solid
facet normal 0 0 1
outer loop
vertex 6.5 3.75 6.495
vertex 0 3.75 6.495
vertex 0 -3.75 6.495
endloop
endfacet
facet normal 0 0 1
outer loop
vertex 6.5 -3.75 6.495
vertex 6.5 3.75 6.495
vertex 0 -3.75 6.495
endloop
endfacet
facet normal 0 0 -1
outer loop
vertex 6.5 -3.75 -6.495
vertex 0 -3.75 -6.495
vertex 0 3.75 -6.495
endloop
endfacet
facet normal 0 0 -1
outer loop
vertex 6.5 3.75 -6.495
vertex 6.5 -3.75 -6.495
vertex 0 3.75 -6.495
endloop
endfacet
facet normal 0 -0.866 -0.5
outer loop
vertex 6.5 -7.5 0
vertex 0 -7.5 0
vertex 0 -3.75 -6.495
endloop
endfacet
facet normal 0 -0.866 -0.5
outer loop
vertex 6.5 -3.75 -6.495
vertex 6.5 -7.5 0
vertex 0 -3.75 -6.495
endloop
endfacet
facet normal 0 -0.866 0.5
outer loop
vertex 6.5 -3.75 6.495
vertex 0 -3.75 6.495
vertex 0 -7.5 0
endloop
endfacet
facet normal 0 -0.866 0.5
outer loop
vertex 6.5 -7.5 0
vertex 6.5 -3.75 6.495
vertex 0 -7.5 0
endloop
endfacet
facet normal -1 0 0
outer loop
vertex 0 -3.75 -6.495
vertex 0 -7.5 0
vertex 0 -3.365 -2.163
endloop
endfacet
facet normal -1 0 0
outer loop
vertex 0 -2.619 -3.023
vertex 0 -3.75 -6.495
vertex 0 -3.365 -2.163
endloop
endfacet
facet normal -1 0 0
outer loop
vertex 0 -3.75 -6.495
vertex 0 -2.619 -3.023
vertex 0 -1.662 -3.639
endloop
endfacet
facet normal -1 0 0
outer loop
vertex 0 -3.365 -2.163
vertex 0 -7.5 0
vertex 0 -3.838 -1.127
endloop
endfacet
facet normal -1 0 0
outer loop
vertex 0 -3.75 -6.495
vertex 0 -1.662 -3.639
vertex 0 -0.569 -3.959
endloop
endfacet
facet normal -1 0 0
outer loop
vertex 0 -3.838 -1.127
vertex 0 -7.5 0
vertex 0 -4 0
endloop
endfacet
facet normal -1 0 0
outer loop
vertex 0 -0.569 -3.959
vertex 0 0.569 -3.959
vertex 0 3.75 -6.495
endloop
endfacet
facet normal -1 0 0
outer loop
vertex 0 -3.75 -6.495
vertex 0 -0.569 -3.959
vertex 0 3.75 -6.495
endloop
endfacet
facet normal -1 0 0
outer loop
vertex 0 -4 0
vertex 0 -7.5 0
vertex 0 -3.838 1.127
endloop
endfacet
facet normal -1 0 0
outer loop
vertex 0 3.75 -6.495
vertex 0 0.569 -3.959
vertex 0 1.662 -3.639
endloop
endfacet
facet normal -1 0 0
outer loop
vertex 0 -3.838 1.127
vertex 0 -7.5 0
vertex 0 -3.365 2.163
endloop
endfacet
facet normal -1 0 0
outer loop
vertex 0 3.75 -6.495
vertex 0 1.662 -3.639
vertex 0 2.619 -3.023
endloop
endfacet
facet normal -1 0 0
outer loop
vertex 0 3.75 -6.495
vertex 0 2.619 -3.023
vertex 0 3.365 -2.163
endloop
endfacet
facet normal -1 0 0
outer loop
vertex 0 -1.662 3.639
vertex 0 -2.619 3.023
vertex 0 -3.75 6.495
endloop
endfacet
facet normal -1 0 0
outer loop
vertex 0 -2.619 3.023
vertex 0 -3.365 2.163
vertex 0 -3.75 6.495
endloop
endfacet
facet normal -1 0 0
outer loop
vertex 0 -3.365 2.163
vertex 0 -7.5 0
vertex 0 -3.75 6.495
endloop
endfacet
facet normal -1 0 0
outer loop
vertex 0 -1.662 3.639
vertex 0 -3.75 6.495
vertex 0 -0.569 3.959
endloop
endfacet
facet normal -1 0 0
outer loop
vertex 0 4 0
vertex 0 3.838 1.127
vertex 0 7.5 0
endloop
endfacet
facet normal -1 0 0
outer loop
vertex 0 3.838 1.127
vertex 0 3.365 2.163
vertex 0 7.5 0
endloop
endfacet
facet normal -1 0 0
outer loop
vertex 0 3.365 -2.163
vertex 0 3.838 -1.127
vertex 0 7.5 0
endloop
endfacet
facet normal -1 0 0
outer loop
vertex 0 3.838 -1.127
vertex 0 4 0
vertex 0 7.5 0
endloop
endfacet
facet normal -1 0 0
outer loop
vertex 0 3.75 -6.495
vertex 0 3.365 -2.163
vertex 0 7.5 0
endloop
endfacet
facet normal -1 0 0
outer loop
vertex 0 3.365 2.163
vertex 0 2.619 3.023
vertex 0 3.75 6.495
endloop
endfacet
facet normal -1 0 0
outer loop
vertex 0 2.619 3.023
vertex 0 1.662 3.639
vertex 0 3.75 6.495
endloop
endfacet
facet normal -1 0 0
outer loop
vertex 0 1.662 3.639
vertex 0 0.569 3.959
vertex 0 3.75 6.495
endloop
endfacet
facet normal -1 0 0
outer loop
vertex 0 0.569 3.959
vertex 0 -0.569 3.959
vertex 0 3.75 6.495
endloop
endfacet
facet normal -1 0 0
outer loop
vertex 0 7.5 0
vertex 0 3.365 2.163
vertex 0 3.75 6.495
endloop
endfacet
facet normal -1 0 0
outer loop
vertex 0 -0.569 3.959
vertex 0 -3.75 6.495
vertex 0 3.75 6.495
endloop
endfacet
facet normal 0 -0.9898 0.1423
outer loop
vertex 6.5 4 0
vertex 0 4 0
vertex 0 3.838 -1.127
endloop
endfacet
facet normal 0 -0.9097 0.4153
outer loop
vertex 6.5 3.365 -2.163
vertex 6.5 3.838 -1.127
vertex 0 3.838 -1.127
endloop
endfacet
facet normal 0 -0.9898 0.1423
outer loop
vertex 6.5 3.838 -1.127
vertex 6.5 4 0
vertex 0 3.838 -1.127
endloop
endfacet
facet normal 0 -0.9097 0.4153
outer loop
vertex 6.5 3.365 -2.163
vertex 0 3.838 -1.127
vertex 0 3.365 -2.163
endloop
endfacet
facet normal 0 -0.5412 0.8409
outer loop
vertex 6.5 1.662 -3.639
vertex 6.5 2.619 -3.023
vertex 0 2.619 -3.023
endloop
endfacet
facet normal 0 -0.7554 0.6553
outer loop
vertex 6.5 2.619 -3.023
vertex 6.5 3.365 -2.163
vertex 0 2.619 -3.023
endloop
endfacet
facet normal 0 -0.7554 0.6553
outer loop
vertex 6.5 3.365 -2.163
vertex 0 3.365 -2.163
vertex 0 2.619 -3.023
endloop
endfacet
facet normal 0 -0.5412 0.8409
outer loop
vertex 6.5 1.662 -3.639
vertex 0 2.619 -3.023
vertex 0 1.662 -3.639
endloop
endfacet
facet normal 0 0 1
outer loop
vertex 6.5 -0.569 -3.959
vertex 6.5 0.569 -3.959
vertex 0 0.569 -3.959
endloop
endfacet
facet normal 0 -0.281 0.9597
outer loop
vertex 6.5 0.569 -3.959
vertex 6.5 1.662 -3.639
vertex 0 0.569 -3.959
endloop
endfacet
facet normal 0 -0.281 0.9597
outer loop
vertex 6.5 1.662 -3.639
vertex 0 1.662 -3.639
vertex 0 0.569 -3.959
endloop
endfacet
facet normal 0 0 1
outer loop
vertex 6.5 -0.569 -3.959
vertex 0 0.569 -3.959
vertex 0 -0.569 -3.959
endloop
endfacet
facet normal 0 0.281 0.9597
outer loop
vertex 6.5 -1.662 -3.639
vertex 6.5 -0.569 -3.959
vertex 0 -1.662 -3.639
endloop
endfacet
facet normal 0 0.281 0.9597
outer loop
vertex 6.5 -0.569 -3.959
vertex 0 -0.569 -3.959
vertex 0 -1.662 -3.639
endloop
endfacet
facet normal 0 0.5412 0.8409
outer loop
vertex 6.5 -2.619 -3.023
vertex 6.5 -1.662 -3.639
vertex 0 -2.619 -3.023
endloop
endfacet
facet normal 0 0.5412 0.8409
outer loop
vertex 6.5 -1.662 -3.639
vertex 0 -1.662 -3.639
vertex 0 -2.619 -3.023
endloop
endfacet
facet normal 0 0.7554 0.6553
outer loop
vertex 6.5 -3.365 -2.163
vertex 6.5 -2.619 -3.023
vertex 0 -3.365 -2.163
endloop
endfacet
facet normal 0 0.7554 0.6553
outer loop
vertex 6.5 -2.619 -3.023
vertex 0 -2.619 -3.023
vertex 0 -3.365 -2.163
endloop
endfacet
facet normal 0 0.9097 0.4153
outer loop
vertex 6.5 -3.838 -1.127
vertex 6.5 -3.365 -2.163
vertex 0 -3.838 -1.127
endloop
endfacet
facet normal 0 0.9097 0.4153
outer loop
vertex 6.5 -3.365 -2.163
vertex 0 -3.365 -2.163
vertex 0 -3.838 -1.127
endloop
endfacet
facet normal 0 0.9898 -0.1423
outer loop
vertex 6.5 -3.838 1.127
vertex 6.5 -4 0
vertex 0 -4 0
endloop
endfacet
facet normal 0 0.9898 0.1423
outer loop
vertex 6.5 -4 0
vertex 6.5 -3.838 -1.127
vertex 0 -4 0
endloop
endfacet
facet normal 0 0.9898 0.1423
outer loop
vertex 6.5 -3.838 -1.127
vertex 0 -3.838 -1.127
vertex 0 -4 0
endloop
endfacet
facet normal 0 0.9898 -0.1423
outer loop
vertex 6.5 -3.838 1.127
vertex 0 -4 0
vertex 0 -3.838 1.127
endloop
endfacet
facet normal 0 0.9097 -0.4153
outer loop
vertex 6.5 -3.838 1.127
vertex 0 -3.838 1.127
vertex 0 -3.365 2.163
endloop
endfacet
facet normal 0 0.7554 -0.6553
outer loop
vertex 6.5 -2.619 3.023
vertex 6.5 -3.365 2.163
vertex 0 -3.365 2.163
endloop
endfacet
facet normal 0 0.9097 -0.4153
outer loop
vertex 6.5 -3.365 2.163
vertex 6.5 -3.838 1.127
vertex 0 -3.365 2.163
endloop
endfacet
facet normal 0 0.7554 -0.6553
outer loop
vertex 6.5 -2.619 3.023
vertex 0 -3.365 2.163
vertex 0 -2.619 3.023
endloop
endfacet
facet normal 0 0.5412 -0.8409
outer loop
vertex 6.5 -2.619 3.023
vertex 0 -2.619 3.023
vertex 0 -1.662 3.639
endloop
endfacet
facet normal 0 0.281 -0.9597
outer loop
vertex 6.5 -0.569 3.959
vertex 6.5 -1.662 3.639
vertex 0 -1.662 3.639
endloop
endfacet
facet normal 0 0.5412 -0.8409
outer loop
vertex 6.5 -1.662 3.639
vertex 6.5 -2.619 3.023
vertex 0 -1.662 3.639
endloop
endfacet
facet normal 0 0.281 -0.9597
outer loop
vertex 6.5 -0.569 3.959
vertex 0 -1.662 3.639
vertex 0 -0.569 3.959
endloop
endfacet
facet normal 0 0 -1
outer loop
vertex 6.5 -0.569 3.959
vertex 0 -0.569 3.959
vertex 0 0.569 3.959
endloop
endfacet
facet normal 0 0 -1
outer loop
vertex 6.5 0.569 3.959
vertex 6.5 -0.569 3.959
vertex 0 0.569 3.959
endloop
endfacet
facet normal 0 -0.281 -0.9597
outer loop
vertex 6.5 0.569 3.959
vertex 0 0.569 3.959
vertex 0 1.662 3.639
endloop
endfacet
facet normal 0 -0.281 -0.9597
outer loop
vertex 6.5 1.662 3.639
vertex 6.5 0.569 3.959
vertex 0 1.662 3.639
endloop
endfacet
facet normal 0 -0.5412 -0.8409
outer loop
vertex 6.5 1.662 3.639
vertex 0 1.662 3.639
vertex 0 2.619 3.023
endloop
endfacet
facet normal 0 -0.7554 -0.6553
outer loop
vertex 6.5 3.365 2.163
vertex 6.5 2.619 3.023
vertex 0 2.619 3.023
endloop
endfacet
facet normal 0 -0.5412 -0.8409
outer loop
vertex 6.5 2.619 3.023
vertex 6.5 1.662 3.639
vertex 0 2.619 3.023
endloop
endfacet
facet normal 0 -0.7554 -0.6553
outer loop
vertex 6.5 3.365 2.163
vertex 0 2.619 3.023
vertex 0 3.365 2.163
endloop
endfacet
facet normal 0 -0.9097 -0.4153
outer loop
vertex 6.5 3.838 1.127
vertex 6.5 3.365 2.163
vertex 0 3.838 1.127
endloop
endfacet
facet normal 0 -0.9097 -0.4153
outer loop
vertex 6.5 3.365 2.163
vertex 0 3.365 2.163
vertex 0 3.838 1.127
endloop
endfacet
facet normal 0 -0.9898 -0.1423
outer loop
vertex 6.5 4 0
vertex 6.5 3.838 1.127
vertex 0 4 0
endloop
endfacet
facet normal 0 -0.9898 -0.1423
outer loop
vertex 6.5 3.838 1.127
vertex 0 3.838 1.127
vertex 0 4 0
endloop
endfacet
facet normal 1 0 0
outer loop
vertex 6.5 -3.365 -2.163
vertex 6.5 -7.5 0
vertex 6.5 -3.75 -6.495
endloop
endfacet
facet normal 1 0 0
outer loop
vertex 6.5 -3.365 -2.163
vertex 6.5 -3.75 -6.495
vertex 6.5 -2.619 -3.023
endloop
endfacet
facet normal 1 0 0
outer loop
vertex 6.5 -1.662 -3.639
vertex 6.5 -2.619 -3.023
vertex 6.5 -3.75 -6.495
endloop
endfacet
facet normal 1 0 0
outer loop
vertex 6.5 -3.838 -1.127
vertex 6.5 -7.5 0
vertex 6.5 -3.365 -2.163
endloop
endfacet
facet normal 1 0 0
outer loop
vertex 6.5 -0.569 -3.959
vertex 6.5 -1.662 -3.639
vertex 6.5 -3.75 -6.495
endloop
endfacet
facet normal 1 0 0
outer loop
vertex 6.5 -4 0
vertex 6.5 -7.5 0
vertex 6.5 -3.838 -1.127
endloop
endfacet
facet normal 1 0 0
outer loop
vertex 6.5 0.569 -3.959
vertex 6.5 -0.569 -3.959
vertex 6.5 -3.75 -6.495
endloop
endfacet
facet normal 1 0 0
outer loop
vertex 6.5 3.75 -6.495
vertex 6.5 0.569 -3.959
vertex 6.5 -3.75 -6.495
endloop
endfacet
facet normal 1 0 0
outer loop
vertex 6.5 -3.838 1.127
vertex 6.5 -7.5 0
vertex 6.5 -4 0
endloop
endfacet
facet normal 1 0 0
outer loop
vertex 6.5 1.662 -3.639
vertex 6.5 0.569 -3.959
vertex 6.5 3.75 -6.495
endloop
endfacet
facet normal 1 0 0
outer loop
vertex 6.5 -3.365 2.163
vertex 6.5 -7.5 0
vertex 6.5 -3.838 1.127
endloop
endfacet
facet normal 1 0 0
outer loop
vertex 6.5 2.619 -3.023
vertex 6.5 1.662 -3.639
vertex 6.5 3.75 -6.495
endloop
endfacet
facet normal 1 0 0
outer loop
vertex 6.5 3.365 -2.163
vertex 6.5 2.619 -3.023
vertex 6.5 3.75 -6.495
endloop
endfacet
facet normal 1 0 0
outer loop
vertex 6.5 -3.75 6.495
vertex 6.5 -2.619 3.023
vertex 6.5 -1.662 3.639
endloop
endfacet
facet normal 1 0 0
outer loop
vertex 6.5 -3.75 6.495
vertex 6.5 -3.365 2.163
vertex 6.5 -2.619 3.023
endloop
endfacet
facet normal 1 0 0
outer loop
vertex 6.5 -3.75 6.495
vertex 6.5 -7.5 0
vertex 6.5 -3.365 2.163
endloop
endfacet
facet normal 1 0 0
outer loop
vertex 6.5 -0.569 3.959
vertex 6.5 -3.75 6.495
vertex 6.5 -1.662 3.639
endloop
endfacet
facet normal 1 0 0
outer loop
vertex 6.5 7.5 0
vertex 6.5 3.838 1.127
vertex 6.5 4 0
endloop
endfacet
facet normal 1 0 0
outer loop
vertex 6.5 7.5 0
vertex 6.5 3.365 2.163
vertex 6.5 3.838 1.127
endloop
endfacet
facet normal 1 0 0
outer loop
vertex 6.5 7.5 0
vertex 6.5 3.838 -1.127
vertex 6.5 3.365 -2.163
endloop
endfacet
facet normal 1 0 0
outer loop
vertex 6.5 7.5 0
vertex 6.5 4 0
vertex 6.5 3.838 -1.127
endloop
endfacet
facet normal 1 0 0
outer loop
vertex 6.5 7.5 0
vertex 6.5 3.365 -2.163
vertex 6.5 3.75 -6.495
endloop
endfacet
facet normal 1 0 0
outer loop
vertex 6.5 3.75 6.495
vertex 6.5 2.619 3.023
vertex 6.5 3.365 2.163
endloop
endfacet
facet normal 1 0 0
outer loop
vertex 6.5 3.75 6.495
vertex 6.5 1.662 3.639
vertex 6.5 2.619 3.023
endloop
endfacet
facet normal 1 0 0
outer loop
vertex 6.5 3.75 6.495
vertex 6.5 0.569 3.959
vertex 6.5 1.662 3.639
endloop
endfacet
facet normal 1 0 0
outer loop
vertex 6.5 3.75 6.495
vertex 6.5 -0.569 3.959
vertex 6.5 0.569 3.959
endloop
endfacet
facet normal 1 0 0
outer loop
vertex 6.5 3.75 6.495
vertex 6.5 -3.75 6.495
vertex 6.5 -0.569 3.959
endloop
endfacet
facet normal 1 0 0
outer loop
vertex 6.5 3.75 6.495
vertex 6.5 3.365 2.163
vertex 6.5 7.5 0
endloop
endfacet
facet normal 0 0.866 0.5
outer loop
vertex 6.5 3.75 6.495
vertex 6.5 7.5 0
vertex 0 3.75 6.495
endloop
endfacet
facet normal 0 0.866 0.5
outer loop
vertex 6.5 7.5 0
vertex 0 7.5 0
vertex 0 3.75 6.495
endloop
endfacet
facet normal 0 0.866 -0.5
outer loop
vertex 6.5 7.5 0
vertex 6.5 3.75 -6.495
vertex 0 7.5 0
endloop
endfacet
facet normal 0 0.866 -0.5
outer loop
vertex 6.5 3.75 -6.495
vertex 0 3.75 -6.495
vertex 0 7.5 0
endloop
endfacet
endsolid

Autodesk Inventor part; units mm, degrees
ref_plane "YZ Plane" through (0, 0, 0) normal (1, 0, 0) x (0, 1, 0)
ref_plane "XZ Plane" through (0, 0, 0) normal (0, 1, 0) x (-1, 0, 0)
ref_plane "XY Plane" through (0, 0, 0) normal (0, 0, 1) x (1, 0, 0)
sketch "スケッチ1" plane through (0, 0, 0) normal (1, 0, 0) x (0, 1, 0)
  circle A0 centre (0, 0) radius 7.5
  line L0 (7.5, 0) -> (3.75, 6.4952)
  line L1 (3.75, 6.4952) -> (-3.75, 6.4952)
  line L2 (-3.75, 6.4952) -> (-7.5, 0)
  line L3 (-7.5, 0) -> (-3.75, -6.4952)
  line L4 (-3.75, -6.4952) -> (3.75, -6.4952)
  line L5 (3.75, -6.4952) -> (7.5, 0)
  circle A1 centre (0, 0) radius 4
  point P0 (3.75, 6.4952)
  point P1 (-3.75, -6.4952)
  dimension "d0" = 15
  dimension "d3" = 360
  dimension "d5" = 8
extrude "押し出し1" add sketch "スケッチ1" along normal blind 6.5 contours L5 L4 L3 L2 L1 L0
properties part number "8min-nut" material "アルミニウム 6061"
